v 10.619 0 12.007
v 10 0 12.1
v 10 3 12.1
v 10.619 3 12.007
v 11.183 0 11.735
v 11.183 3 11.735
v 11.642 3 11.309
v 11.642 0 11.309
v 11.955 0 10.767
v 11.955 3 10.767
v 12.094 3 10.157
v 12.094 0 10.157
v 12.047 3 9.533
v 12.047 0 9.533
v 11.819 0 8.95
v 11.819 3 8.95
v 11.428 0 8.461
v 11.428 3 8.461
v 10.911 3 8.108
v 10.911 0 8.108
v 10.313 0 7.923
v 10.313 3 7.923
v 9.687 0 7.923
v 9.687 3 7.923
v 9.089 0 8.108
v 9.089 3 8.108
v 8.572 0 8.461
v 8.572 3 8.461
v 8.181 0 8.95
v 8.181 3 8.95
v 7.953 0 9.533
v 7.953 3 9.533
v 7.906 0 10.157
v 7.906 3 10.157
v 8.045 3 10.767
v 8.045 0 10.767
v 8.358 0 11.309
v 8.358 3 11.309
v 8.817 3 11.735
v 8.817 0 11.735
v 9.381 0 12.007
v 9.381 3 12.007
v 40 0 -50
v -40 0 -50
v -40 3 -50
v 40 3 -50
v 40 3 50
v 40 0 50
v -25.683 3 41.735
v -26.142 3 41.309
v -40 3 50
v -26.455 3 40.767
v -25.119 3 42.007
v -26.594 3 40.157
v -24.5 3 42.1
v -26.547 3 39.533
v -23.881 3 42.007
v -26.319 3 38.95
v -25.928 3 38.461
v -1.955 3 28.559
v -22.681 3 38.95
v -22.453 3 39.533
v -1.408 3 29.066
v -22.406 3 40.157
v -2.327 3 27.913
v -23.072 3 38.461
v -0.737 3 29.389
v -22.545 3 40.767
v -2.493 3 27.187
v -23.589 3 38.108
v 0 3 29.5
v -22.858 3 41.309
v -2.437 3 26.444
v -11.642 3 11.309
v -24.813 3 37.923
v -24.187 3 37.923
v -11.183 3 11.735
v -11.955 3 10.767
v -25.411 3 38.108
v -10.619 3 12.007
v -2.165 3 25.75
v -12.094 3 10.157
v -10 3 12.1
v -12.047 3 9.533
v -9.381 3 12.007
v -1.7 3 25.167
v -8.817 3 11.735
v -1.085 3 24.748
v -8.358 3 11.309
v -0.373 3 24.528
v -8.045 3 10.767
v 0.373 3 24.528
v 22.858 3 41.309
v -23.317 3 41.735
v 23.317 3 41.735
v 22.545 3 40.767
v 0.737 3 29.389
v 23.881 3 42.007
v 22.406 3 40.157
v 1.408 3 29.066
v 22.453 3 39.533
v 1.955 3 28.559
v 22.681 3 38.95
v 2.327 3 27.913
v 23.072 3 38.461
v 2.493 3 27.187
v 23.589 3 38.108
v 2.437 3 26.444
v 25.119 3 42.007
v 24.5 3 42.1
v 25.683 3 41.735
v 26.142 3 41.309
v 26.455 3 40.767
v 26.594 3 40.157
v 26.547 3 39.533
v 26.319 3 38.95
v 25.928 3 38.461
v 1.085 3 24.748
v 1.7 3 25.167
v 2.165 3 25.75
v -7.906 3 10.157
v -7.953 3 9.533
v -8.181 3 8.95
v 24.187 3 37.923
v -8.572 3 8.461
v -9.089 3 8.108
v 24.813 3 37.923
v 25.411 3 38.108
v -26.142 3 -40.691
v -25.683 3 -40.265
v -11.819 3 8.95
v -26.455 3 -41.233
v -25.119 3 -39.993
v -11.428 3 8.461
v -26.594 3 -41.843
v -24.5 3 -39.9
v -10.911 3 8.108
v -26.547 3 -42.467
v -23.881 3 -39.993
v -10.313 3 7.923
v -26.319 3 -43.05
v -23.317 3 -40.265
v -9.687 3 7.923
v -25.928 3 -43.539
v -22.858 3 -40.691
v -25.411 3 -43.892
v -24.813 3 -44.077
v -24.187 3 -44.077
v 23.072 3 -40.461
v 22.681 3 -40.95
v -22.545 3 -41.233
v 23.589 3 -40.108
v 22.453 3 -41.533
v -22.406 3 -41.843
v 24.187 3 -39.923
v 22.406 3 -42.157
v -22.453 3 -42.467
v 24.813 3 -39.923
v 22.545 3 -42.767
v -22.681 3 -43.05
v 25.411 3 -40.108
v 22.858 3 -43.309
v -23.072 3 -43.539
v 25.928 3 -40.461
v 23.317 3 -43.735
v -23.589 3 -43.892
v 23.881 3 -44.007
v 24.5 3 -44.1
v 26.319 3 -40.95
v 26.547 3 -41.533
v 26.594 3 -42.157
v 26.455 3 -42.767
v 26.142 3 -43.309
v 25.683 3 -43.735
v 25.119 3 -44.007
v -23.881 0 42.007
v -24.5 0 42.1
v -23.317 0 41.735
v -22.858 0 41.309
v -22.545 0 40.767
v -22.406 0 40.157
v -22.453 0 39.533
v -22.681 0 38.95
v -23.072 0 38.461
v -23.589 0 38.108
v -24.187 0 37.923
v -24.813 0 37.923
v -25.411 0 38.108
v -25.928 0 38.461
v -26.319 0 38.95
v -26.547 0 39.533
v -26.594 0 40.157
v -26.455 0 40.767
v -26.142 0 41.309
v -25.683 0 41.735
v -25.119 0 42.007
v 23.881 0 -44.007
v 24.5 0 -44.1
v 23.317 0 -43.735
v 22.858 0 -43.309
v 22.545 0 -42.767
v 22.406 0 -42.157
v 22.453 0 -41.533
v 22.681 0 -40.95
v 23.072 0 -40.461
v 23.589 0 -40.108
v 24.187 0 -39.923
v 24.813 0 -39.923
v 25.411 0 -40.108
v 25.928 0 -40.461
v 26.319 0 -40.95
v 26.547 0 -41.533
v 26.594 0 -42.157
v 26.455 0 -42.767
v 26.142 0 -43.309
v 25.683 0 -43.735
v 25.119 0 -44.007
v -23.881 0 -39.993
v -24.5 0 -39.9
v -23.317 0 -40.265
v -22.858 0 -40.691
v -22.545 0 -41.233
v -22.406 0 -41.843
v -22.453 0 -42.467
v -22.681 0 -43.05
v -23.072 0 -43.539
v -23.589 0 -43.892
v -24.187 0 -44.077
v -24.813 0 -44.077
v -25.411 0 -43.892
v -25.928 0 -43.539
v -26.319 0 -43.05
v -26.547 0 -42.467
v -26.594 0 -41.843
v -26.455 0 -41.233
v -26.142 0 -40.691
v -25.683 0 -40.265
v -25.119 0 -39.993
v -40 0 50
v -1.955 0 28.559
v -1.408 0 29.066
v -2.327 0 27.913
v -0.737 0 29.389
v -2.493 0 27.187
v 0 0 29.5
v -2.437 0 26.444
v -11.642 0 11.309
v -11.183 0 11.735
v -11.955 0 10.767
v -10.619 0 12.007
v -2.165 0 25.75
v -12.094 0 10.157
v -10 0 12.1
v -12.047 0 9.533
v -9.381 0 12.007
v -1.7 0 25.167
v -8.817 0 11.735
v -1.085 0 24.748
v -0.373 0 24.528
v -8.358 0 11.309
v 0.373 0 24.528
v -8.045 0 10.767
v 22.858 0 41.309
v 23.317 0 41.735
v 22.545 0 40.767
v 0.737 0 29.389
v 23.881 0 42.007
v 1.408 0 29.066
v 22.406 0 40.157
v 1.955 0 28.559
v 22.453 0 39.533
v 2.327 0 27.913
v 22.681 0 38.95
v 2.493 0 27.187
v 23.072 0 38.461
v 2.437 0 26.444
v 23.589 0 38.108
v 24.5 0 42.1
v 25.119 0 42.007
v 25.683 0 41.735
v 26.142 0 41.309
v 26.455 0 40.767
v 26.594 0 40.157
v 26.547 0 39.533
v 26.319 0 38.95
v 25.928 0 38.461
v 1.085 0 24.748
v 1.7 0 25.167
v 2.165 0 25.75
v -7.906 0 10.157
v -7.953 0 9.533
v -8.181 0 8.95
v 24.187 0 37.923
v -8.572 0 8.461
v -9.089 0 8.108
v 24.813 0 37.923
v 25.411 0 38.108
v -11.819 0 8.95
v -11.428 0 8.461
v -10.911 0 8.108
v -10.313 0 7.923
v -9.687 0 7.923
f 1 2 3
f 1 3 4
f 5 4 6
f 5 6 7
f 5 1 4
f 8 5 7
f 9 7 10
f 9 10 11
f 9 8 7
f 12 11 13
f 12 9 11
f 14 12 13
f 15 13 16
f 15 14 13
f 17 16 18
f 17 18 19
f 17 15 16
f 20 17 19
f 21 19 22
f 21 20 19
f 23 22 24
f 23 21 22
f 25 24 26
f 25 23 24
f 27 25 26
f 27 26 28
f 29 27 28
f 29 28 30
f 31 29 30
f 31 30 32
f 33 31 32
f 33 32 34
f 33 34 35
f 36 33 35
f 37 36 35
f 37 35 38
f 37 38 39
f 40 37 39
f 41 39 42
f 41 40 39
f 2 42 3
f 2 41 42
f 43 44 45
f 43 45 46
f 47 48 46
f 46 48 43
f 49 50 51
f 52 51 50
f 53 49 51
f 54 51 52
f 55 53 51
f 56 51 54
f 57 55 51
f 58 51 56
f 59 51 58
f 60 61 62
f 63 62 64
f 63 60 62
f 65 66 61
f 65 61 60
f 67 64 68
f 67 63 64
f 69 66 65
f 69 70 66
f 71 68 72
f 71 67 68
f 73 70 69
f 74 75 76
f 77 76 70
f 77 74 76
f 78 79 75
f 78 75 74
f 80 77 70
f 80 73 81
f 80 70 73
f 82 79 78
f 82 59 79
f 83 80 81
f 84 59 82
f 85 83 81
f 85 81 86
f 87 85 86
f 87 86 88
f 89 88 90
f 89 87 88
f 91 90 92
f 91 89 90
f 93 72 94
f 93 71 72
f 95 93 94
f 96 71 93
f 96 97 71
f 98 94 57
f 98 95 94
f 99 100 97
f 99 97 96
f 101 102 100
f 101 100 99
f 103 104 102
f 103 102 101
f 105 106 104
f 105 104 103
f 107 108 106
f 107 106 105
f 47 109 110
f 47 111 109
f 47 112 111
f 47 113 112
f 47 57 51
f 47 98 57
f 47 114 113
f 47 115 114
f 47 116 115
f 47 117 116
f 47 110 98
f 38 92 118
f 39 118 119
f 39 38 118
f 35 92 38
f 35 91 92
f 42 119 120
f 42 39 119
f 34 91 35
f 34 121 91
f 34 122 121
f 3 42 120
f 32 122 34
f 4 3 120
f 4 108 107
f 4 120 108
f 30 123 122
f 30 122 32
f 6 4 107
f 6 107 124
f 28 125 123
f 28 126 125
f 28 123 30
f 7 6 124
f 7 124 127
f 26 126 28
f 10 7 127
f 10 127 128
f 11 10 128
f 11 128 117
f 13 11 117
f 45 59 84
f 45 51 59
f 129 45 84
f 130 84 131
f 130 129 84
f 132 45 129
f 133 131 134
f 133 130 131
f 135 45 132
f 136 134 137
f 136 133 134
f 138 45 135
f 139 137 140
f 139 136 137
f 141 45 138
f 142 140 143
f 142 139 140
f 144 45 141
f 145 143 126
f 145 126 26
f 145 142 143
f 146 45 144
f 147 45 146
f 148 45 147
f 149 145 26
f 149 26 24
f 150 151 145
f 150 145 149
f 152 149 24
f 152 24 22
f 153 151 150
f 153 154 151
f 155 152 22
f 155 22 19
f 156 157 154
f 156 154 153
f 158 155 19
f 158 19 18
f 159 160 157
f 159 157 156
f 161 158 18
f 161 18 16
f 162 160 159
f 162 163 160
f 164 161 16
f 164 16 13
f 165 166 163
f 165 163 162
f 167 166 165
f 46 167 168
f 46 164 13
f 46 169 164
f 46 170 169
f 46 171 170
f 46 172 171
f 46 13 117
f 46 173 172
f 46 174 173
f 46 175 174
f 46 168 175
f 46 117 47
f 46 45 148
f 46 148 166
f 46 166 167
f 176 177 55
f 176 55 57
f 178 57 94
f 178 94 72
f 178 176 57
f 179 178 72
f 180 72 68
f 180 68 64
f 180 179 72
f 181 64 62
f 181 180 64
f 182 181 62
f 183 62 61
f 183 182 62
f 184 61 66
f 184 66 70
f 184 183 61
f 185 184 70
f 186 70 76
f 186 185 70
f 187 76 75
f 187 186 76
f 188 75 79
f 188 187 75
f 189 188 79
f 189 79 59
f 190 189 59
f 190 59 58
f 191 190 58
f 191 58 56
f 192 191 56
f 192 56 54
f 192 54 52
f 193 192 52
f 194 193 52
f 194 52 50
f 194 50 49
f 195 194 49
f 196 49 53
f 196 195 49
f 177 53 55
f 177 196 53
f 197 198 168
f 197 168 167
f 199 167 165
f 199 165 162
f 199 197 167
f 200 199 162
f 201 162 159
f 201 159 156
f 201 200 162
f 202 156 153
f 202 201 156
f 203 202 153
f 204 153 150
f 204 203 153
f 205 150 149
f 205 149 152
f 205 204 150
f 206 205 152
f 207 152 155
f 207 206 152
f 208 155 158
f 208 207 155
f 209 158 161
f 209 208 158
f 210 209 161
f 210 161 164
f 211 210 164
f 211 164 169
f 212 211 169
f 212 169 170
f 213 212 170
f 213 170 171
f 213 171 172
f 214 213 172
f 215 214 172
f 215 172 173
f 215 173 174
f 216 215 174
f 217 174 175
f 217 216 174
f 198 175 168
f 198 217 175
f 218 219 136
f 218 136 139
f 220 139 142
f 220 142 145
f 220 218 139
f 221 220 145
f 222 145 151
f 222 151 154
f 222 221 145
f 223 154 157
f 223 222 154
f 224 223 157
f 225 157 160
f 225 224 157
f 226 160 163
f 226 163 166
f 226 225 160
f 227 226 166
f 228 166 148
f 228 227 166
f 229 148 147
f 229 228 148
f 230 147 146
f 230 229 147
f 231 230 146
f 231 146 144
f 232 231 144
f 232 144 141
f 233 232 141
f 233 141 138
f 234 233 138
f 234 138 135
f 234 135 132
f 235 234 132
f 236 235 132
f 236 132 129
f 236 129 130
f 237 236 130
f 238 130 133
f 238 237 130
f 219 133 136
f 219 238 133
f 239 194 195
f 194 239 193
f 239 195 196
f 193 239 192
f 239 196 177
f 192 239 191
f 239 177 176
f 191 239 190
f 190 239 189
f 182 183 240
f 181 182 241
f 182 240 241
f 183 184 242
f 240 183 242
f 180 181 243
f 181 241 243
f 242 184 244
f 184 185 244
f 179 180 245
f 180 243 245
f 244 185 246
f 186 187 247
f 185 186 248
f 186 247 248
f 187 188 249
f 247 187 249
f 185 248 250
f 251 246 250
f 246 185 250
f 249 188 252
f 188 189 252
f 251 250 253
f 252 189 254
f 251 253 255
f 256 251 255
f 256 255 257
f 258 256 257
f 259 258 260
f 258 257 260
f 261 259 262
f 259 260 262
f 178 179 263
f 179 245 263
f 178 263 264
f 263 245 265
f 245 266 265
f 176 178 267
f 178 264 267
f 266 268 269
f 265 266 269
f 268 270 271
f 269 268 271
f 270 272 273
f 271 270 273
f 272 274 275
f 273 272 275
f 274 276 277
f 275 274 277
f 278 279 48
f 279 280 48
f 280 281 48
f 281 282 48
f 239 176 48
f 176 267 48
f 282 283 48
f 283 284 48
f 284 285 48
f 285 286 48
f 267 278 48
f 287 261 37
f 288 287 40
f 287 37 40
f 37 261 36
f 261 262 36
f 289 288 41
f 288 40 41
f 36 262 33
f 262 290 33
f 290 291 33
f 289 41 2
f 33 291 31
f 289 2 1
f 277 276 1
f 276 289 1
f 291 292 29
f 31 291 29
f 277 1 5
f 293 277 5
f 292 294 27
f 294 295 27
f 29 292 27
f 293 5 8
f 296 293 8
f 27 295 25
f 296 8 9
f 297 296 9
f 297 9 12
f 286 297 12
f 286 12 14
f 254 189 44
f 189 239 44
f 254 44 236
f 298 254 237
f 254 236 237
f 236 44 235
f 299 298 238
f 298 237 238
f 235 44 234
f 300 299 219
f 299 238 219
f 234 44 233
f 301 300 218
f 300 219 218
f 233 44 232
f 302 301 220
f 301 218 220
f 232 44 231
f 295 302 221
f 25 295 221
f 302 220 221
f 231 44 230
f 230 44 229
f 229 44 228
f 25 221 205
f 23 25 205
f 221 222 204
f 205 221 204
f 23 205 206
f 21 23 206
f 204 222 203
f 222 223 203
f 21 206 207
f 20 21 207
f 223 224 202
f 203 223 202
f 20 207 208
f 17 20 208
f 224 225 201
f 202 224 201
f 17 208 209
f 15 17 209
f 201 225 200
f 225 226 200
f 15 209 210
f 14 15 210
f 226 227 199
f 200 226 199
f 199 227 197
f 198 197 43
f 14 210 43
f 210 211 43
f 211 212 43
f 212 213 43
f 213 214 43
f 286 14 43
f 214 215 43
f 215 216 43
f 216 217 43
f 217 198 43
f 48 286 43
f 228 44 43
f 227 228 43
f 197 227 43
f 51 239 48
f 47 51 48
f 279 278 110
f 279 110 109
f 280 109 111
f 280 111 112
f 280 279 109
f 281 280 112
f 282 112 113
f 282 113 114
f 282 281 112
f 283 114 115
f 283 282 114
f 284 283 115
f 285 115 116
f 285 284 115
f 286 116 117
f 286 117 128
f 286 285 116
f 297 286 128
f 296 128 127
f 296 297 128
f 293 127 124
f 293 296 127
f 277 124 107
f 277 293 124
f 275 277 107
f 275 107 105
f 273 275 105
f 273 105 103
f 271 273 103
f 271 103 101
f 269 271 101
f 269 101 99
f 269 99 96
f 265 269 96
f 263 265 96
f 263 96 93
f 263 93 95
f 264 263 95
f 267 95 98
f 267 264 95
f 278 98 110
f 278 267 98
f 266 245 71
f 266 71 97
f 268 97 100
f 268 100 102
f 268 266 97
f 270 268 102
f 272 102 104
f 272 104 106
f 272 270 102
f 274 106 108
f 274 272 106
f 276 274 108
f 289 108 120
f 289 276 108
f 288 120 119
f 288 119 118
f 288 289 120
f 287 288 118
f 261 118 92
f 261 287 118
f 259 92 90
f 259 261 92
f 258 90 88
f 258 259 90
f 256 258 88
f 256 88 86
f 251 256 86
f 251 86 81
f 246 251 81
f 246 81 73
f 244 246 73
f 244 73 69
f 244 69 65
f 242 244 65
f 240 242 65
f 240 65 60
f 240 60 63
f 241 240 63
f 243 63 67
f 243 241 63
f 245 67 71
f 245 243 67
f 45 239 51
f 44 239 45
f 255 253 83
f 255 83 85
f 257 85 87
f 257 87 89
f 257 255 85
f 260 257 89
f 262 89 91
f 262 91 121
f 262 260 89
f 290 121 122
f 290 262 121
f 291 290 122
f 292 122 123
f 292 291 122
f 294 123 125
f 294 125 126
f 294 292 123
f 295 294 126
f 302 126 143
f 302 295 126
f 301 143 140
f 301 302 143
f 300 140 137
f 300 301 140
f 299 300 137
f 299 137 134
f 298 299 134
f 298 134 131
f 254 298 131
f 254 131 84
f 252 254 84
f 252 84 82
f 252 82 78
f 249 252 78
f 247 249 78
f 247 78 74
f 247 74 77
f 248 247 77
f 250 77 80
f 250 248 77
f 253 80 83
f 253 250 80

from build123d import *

# Parameters (mm, degrees)
SKETCH1_W           = 80
SKETCH1_H           = 100
SKETCH1_R           = 2.1
SKETCH1_R_2         = 2.5
BOSS_EXTRUDE1_DEPTH = 3


with BuildPart() as part:
    # Sketch1 → Boss-Extrude1 (new body)
    with BuildSketch(Plane(origin=(0, 0, 0), x_dir=(1, 0, 0), z_dir=(0, 1, 0))):
        Rectangle(SKETCH1_W, SKETCH1_H)
        with Locations(Location((24.5, 42, 0), (0, 0, 90))):
            Circle(SKETCH1_R, mode=Mode.SUBTRACT)
        with Locations(Location((-24.5, 42, 0), (0, 0, 270))):
            Circle(SKETCH1_R, mode=Mode.SUBTRACT)
        with Locations(Location((24.5, -40, 0), (0, 0, 270))):
            Circle(SKETCH1_R, mode=Mode.SUBTRACT)
        with Locations(Location((-24.5, -40, 0), (0, 0, 270))):
            Circle(SKETCH1_R, mode=Mode.SUBTRACT)
        with Locations(Location((10, -10, 0), (0, 0, 270))):
            Circle(SKETCH1_R, mode=Mode.SUBTRACT)
        with Locations(Location((-10, -10, 0), (0, 0, 270))):
            Circle(SKETCH1_R, mode=Mode.SUBTRACT)
        with Locations(Location((0, -27, 0), (0, 0, 270))):
            Circle(SKETCH1_R_2, mode=Mode.SUBTRACT)
    extrude(amount=BOSS_EXTRUDE1_DEPTH)


solid = part.part
